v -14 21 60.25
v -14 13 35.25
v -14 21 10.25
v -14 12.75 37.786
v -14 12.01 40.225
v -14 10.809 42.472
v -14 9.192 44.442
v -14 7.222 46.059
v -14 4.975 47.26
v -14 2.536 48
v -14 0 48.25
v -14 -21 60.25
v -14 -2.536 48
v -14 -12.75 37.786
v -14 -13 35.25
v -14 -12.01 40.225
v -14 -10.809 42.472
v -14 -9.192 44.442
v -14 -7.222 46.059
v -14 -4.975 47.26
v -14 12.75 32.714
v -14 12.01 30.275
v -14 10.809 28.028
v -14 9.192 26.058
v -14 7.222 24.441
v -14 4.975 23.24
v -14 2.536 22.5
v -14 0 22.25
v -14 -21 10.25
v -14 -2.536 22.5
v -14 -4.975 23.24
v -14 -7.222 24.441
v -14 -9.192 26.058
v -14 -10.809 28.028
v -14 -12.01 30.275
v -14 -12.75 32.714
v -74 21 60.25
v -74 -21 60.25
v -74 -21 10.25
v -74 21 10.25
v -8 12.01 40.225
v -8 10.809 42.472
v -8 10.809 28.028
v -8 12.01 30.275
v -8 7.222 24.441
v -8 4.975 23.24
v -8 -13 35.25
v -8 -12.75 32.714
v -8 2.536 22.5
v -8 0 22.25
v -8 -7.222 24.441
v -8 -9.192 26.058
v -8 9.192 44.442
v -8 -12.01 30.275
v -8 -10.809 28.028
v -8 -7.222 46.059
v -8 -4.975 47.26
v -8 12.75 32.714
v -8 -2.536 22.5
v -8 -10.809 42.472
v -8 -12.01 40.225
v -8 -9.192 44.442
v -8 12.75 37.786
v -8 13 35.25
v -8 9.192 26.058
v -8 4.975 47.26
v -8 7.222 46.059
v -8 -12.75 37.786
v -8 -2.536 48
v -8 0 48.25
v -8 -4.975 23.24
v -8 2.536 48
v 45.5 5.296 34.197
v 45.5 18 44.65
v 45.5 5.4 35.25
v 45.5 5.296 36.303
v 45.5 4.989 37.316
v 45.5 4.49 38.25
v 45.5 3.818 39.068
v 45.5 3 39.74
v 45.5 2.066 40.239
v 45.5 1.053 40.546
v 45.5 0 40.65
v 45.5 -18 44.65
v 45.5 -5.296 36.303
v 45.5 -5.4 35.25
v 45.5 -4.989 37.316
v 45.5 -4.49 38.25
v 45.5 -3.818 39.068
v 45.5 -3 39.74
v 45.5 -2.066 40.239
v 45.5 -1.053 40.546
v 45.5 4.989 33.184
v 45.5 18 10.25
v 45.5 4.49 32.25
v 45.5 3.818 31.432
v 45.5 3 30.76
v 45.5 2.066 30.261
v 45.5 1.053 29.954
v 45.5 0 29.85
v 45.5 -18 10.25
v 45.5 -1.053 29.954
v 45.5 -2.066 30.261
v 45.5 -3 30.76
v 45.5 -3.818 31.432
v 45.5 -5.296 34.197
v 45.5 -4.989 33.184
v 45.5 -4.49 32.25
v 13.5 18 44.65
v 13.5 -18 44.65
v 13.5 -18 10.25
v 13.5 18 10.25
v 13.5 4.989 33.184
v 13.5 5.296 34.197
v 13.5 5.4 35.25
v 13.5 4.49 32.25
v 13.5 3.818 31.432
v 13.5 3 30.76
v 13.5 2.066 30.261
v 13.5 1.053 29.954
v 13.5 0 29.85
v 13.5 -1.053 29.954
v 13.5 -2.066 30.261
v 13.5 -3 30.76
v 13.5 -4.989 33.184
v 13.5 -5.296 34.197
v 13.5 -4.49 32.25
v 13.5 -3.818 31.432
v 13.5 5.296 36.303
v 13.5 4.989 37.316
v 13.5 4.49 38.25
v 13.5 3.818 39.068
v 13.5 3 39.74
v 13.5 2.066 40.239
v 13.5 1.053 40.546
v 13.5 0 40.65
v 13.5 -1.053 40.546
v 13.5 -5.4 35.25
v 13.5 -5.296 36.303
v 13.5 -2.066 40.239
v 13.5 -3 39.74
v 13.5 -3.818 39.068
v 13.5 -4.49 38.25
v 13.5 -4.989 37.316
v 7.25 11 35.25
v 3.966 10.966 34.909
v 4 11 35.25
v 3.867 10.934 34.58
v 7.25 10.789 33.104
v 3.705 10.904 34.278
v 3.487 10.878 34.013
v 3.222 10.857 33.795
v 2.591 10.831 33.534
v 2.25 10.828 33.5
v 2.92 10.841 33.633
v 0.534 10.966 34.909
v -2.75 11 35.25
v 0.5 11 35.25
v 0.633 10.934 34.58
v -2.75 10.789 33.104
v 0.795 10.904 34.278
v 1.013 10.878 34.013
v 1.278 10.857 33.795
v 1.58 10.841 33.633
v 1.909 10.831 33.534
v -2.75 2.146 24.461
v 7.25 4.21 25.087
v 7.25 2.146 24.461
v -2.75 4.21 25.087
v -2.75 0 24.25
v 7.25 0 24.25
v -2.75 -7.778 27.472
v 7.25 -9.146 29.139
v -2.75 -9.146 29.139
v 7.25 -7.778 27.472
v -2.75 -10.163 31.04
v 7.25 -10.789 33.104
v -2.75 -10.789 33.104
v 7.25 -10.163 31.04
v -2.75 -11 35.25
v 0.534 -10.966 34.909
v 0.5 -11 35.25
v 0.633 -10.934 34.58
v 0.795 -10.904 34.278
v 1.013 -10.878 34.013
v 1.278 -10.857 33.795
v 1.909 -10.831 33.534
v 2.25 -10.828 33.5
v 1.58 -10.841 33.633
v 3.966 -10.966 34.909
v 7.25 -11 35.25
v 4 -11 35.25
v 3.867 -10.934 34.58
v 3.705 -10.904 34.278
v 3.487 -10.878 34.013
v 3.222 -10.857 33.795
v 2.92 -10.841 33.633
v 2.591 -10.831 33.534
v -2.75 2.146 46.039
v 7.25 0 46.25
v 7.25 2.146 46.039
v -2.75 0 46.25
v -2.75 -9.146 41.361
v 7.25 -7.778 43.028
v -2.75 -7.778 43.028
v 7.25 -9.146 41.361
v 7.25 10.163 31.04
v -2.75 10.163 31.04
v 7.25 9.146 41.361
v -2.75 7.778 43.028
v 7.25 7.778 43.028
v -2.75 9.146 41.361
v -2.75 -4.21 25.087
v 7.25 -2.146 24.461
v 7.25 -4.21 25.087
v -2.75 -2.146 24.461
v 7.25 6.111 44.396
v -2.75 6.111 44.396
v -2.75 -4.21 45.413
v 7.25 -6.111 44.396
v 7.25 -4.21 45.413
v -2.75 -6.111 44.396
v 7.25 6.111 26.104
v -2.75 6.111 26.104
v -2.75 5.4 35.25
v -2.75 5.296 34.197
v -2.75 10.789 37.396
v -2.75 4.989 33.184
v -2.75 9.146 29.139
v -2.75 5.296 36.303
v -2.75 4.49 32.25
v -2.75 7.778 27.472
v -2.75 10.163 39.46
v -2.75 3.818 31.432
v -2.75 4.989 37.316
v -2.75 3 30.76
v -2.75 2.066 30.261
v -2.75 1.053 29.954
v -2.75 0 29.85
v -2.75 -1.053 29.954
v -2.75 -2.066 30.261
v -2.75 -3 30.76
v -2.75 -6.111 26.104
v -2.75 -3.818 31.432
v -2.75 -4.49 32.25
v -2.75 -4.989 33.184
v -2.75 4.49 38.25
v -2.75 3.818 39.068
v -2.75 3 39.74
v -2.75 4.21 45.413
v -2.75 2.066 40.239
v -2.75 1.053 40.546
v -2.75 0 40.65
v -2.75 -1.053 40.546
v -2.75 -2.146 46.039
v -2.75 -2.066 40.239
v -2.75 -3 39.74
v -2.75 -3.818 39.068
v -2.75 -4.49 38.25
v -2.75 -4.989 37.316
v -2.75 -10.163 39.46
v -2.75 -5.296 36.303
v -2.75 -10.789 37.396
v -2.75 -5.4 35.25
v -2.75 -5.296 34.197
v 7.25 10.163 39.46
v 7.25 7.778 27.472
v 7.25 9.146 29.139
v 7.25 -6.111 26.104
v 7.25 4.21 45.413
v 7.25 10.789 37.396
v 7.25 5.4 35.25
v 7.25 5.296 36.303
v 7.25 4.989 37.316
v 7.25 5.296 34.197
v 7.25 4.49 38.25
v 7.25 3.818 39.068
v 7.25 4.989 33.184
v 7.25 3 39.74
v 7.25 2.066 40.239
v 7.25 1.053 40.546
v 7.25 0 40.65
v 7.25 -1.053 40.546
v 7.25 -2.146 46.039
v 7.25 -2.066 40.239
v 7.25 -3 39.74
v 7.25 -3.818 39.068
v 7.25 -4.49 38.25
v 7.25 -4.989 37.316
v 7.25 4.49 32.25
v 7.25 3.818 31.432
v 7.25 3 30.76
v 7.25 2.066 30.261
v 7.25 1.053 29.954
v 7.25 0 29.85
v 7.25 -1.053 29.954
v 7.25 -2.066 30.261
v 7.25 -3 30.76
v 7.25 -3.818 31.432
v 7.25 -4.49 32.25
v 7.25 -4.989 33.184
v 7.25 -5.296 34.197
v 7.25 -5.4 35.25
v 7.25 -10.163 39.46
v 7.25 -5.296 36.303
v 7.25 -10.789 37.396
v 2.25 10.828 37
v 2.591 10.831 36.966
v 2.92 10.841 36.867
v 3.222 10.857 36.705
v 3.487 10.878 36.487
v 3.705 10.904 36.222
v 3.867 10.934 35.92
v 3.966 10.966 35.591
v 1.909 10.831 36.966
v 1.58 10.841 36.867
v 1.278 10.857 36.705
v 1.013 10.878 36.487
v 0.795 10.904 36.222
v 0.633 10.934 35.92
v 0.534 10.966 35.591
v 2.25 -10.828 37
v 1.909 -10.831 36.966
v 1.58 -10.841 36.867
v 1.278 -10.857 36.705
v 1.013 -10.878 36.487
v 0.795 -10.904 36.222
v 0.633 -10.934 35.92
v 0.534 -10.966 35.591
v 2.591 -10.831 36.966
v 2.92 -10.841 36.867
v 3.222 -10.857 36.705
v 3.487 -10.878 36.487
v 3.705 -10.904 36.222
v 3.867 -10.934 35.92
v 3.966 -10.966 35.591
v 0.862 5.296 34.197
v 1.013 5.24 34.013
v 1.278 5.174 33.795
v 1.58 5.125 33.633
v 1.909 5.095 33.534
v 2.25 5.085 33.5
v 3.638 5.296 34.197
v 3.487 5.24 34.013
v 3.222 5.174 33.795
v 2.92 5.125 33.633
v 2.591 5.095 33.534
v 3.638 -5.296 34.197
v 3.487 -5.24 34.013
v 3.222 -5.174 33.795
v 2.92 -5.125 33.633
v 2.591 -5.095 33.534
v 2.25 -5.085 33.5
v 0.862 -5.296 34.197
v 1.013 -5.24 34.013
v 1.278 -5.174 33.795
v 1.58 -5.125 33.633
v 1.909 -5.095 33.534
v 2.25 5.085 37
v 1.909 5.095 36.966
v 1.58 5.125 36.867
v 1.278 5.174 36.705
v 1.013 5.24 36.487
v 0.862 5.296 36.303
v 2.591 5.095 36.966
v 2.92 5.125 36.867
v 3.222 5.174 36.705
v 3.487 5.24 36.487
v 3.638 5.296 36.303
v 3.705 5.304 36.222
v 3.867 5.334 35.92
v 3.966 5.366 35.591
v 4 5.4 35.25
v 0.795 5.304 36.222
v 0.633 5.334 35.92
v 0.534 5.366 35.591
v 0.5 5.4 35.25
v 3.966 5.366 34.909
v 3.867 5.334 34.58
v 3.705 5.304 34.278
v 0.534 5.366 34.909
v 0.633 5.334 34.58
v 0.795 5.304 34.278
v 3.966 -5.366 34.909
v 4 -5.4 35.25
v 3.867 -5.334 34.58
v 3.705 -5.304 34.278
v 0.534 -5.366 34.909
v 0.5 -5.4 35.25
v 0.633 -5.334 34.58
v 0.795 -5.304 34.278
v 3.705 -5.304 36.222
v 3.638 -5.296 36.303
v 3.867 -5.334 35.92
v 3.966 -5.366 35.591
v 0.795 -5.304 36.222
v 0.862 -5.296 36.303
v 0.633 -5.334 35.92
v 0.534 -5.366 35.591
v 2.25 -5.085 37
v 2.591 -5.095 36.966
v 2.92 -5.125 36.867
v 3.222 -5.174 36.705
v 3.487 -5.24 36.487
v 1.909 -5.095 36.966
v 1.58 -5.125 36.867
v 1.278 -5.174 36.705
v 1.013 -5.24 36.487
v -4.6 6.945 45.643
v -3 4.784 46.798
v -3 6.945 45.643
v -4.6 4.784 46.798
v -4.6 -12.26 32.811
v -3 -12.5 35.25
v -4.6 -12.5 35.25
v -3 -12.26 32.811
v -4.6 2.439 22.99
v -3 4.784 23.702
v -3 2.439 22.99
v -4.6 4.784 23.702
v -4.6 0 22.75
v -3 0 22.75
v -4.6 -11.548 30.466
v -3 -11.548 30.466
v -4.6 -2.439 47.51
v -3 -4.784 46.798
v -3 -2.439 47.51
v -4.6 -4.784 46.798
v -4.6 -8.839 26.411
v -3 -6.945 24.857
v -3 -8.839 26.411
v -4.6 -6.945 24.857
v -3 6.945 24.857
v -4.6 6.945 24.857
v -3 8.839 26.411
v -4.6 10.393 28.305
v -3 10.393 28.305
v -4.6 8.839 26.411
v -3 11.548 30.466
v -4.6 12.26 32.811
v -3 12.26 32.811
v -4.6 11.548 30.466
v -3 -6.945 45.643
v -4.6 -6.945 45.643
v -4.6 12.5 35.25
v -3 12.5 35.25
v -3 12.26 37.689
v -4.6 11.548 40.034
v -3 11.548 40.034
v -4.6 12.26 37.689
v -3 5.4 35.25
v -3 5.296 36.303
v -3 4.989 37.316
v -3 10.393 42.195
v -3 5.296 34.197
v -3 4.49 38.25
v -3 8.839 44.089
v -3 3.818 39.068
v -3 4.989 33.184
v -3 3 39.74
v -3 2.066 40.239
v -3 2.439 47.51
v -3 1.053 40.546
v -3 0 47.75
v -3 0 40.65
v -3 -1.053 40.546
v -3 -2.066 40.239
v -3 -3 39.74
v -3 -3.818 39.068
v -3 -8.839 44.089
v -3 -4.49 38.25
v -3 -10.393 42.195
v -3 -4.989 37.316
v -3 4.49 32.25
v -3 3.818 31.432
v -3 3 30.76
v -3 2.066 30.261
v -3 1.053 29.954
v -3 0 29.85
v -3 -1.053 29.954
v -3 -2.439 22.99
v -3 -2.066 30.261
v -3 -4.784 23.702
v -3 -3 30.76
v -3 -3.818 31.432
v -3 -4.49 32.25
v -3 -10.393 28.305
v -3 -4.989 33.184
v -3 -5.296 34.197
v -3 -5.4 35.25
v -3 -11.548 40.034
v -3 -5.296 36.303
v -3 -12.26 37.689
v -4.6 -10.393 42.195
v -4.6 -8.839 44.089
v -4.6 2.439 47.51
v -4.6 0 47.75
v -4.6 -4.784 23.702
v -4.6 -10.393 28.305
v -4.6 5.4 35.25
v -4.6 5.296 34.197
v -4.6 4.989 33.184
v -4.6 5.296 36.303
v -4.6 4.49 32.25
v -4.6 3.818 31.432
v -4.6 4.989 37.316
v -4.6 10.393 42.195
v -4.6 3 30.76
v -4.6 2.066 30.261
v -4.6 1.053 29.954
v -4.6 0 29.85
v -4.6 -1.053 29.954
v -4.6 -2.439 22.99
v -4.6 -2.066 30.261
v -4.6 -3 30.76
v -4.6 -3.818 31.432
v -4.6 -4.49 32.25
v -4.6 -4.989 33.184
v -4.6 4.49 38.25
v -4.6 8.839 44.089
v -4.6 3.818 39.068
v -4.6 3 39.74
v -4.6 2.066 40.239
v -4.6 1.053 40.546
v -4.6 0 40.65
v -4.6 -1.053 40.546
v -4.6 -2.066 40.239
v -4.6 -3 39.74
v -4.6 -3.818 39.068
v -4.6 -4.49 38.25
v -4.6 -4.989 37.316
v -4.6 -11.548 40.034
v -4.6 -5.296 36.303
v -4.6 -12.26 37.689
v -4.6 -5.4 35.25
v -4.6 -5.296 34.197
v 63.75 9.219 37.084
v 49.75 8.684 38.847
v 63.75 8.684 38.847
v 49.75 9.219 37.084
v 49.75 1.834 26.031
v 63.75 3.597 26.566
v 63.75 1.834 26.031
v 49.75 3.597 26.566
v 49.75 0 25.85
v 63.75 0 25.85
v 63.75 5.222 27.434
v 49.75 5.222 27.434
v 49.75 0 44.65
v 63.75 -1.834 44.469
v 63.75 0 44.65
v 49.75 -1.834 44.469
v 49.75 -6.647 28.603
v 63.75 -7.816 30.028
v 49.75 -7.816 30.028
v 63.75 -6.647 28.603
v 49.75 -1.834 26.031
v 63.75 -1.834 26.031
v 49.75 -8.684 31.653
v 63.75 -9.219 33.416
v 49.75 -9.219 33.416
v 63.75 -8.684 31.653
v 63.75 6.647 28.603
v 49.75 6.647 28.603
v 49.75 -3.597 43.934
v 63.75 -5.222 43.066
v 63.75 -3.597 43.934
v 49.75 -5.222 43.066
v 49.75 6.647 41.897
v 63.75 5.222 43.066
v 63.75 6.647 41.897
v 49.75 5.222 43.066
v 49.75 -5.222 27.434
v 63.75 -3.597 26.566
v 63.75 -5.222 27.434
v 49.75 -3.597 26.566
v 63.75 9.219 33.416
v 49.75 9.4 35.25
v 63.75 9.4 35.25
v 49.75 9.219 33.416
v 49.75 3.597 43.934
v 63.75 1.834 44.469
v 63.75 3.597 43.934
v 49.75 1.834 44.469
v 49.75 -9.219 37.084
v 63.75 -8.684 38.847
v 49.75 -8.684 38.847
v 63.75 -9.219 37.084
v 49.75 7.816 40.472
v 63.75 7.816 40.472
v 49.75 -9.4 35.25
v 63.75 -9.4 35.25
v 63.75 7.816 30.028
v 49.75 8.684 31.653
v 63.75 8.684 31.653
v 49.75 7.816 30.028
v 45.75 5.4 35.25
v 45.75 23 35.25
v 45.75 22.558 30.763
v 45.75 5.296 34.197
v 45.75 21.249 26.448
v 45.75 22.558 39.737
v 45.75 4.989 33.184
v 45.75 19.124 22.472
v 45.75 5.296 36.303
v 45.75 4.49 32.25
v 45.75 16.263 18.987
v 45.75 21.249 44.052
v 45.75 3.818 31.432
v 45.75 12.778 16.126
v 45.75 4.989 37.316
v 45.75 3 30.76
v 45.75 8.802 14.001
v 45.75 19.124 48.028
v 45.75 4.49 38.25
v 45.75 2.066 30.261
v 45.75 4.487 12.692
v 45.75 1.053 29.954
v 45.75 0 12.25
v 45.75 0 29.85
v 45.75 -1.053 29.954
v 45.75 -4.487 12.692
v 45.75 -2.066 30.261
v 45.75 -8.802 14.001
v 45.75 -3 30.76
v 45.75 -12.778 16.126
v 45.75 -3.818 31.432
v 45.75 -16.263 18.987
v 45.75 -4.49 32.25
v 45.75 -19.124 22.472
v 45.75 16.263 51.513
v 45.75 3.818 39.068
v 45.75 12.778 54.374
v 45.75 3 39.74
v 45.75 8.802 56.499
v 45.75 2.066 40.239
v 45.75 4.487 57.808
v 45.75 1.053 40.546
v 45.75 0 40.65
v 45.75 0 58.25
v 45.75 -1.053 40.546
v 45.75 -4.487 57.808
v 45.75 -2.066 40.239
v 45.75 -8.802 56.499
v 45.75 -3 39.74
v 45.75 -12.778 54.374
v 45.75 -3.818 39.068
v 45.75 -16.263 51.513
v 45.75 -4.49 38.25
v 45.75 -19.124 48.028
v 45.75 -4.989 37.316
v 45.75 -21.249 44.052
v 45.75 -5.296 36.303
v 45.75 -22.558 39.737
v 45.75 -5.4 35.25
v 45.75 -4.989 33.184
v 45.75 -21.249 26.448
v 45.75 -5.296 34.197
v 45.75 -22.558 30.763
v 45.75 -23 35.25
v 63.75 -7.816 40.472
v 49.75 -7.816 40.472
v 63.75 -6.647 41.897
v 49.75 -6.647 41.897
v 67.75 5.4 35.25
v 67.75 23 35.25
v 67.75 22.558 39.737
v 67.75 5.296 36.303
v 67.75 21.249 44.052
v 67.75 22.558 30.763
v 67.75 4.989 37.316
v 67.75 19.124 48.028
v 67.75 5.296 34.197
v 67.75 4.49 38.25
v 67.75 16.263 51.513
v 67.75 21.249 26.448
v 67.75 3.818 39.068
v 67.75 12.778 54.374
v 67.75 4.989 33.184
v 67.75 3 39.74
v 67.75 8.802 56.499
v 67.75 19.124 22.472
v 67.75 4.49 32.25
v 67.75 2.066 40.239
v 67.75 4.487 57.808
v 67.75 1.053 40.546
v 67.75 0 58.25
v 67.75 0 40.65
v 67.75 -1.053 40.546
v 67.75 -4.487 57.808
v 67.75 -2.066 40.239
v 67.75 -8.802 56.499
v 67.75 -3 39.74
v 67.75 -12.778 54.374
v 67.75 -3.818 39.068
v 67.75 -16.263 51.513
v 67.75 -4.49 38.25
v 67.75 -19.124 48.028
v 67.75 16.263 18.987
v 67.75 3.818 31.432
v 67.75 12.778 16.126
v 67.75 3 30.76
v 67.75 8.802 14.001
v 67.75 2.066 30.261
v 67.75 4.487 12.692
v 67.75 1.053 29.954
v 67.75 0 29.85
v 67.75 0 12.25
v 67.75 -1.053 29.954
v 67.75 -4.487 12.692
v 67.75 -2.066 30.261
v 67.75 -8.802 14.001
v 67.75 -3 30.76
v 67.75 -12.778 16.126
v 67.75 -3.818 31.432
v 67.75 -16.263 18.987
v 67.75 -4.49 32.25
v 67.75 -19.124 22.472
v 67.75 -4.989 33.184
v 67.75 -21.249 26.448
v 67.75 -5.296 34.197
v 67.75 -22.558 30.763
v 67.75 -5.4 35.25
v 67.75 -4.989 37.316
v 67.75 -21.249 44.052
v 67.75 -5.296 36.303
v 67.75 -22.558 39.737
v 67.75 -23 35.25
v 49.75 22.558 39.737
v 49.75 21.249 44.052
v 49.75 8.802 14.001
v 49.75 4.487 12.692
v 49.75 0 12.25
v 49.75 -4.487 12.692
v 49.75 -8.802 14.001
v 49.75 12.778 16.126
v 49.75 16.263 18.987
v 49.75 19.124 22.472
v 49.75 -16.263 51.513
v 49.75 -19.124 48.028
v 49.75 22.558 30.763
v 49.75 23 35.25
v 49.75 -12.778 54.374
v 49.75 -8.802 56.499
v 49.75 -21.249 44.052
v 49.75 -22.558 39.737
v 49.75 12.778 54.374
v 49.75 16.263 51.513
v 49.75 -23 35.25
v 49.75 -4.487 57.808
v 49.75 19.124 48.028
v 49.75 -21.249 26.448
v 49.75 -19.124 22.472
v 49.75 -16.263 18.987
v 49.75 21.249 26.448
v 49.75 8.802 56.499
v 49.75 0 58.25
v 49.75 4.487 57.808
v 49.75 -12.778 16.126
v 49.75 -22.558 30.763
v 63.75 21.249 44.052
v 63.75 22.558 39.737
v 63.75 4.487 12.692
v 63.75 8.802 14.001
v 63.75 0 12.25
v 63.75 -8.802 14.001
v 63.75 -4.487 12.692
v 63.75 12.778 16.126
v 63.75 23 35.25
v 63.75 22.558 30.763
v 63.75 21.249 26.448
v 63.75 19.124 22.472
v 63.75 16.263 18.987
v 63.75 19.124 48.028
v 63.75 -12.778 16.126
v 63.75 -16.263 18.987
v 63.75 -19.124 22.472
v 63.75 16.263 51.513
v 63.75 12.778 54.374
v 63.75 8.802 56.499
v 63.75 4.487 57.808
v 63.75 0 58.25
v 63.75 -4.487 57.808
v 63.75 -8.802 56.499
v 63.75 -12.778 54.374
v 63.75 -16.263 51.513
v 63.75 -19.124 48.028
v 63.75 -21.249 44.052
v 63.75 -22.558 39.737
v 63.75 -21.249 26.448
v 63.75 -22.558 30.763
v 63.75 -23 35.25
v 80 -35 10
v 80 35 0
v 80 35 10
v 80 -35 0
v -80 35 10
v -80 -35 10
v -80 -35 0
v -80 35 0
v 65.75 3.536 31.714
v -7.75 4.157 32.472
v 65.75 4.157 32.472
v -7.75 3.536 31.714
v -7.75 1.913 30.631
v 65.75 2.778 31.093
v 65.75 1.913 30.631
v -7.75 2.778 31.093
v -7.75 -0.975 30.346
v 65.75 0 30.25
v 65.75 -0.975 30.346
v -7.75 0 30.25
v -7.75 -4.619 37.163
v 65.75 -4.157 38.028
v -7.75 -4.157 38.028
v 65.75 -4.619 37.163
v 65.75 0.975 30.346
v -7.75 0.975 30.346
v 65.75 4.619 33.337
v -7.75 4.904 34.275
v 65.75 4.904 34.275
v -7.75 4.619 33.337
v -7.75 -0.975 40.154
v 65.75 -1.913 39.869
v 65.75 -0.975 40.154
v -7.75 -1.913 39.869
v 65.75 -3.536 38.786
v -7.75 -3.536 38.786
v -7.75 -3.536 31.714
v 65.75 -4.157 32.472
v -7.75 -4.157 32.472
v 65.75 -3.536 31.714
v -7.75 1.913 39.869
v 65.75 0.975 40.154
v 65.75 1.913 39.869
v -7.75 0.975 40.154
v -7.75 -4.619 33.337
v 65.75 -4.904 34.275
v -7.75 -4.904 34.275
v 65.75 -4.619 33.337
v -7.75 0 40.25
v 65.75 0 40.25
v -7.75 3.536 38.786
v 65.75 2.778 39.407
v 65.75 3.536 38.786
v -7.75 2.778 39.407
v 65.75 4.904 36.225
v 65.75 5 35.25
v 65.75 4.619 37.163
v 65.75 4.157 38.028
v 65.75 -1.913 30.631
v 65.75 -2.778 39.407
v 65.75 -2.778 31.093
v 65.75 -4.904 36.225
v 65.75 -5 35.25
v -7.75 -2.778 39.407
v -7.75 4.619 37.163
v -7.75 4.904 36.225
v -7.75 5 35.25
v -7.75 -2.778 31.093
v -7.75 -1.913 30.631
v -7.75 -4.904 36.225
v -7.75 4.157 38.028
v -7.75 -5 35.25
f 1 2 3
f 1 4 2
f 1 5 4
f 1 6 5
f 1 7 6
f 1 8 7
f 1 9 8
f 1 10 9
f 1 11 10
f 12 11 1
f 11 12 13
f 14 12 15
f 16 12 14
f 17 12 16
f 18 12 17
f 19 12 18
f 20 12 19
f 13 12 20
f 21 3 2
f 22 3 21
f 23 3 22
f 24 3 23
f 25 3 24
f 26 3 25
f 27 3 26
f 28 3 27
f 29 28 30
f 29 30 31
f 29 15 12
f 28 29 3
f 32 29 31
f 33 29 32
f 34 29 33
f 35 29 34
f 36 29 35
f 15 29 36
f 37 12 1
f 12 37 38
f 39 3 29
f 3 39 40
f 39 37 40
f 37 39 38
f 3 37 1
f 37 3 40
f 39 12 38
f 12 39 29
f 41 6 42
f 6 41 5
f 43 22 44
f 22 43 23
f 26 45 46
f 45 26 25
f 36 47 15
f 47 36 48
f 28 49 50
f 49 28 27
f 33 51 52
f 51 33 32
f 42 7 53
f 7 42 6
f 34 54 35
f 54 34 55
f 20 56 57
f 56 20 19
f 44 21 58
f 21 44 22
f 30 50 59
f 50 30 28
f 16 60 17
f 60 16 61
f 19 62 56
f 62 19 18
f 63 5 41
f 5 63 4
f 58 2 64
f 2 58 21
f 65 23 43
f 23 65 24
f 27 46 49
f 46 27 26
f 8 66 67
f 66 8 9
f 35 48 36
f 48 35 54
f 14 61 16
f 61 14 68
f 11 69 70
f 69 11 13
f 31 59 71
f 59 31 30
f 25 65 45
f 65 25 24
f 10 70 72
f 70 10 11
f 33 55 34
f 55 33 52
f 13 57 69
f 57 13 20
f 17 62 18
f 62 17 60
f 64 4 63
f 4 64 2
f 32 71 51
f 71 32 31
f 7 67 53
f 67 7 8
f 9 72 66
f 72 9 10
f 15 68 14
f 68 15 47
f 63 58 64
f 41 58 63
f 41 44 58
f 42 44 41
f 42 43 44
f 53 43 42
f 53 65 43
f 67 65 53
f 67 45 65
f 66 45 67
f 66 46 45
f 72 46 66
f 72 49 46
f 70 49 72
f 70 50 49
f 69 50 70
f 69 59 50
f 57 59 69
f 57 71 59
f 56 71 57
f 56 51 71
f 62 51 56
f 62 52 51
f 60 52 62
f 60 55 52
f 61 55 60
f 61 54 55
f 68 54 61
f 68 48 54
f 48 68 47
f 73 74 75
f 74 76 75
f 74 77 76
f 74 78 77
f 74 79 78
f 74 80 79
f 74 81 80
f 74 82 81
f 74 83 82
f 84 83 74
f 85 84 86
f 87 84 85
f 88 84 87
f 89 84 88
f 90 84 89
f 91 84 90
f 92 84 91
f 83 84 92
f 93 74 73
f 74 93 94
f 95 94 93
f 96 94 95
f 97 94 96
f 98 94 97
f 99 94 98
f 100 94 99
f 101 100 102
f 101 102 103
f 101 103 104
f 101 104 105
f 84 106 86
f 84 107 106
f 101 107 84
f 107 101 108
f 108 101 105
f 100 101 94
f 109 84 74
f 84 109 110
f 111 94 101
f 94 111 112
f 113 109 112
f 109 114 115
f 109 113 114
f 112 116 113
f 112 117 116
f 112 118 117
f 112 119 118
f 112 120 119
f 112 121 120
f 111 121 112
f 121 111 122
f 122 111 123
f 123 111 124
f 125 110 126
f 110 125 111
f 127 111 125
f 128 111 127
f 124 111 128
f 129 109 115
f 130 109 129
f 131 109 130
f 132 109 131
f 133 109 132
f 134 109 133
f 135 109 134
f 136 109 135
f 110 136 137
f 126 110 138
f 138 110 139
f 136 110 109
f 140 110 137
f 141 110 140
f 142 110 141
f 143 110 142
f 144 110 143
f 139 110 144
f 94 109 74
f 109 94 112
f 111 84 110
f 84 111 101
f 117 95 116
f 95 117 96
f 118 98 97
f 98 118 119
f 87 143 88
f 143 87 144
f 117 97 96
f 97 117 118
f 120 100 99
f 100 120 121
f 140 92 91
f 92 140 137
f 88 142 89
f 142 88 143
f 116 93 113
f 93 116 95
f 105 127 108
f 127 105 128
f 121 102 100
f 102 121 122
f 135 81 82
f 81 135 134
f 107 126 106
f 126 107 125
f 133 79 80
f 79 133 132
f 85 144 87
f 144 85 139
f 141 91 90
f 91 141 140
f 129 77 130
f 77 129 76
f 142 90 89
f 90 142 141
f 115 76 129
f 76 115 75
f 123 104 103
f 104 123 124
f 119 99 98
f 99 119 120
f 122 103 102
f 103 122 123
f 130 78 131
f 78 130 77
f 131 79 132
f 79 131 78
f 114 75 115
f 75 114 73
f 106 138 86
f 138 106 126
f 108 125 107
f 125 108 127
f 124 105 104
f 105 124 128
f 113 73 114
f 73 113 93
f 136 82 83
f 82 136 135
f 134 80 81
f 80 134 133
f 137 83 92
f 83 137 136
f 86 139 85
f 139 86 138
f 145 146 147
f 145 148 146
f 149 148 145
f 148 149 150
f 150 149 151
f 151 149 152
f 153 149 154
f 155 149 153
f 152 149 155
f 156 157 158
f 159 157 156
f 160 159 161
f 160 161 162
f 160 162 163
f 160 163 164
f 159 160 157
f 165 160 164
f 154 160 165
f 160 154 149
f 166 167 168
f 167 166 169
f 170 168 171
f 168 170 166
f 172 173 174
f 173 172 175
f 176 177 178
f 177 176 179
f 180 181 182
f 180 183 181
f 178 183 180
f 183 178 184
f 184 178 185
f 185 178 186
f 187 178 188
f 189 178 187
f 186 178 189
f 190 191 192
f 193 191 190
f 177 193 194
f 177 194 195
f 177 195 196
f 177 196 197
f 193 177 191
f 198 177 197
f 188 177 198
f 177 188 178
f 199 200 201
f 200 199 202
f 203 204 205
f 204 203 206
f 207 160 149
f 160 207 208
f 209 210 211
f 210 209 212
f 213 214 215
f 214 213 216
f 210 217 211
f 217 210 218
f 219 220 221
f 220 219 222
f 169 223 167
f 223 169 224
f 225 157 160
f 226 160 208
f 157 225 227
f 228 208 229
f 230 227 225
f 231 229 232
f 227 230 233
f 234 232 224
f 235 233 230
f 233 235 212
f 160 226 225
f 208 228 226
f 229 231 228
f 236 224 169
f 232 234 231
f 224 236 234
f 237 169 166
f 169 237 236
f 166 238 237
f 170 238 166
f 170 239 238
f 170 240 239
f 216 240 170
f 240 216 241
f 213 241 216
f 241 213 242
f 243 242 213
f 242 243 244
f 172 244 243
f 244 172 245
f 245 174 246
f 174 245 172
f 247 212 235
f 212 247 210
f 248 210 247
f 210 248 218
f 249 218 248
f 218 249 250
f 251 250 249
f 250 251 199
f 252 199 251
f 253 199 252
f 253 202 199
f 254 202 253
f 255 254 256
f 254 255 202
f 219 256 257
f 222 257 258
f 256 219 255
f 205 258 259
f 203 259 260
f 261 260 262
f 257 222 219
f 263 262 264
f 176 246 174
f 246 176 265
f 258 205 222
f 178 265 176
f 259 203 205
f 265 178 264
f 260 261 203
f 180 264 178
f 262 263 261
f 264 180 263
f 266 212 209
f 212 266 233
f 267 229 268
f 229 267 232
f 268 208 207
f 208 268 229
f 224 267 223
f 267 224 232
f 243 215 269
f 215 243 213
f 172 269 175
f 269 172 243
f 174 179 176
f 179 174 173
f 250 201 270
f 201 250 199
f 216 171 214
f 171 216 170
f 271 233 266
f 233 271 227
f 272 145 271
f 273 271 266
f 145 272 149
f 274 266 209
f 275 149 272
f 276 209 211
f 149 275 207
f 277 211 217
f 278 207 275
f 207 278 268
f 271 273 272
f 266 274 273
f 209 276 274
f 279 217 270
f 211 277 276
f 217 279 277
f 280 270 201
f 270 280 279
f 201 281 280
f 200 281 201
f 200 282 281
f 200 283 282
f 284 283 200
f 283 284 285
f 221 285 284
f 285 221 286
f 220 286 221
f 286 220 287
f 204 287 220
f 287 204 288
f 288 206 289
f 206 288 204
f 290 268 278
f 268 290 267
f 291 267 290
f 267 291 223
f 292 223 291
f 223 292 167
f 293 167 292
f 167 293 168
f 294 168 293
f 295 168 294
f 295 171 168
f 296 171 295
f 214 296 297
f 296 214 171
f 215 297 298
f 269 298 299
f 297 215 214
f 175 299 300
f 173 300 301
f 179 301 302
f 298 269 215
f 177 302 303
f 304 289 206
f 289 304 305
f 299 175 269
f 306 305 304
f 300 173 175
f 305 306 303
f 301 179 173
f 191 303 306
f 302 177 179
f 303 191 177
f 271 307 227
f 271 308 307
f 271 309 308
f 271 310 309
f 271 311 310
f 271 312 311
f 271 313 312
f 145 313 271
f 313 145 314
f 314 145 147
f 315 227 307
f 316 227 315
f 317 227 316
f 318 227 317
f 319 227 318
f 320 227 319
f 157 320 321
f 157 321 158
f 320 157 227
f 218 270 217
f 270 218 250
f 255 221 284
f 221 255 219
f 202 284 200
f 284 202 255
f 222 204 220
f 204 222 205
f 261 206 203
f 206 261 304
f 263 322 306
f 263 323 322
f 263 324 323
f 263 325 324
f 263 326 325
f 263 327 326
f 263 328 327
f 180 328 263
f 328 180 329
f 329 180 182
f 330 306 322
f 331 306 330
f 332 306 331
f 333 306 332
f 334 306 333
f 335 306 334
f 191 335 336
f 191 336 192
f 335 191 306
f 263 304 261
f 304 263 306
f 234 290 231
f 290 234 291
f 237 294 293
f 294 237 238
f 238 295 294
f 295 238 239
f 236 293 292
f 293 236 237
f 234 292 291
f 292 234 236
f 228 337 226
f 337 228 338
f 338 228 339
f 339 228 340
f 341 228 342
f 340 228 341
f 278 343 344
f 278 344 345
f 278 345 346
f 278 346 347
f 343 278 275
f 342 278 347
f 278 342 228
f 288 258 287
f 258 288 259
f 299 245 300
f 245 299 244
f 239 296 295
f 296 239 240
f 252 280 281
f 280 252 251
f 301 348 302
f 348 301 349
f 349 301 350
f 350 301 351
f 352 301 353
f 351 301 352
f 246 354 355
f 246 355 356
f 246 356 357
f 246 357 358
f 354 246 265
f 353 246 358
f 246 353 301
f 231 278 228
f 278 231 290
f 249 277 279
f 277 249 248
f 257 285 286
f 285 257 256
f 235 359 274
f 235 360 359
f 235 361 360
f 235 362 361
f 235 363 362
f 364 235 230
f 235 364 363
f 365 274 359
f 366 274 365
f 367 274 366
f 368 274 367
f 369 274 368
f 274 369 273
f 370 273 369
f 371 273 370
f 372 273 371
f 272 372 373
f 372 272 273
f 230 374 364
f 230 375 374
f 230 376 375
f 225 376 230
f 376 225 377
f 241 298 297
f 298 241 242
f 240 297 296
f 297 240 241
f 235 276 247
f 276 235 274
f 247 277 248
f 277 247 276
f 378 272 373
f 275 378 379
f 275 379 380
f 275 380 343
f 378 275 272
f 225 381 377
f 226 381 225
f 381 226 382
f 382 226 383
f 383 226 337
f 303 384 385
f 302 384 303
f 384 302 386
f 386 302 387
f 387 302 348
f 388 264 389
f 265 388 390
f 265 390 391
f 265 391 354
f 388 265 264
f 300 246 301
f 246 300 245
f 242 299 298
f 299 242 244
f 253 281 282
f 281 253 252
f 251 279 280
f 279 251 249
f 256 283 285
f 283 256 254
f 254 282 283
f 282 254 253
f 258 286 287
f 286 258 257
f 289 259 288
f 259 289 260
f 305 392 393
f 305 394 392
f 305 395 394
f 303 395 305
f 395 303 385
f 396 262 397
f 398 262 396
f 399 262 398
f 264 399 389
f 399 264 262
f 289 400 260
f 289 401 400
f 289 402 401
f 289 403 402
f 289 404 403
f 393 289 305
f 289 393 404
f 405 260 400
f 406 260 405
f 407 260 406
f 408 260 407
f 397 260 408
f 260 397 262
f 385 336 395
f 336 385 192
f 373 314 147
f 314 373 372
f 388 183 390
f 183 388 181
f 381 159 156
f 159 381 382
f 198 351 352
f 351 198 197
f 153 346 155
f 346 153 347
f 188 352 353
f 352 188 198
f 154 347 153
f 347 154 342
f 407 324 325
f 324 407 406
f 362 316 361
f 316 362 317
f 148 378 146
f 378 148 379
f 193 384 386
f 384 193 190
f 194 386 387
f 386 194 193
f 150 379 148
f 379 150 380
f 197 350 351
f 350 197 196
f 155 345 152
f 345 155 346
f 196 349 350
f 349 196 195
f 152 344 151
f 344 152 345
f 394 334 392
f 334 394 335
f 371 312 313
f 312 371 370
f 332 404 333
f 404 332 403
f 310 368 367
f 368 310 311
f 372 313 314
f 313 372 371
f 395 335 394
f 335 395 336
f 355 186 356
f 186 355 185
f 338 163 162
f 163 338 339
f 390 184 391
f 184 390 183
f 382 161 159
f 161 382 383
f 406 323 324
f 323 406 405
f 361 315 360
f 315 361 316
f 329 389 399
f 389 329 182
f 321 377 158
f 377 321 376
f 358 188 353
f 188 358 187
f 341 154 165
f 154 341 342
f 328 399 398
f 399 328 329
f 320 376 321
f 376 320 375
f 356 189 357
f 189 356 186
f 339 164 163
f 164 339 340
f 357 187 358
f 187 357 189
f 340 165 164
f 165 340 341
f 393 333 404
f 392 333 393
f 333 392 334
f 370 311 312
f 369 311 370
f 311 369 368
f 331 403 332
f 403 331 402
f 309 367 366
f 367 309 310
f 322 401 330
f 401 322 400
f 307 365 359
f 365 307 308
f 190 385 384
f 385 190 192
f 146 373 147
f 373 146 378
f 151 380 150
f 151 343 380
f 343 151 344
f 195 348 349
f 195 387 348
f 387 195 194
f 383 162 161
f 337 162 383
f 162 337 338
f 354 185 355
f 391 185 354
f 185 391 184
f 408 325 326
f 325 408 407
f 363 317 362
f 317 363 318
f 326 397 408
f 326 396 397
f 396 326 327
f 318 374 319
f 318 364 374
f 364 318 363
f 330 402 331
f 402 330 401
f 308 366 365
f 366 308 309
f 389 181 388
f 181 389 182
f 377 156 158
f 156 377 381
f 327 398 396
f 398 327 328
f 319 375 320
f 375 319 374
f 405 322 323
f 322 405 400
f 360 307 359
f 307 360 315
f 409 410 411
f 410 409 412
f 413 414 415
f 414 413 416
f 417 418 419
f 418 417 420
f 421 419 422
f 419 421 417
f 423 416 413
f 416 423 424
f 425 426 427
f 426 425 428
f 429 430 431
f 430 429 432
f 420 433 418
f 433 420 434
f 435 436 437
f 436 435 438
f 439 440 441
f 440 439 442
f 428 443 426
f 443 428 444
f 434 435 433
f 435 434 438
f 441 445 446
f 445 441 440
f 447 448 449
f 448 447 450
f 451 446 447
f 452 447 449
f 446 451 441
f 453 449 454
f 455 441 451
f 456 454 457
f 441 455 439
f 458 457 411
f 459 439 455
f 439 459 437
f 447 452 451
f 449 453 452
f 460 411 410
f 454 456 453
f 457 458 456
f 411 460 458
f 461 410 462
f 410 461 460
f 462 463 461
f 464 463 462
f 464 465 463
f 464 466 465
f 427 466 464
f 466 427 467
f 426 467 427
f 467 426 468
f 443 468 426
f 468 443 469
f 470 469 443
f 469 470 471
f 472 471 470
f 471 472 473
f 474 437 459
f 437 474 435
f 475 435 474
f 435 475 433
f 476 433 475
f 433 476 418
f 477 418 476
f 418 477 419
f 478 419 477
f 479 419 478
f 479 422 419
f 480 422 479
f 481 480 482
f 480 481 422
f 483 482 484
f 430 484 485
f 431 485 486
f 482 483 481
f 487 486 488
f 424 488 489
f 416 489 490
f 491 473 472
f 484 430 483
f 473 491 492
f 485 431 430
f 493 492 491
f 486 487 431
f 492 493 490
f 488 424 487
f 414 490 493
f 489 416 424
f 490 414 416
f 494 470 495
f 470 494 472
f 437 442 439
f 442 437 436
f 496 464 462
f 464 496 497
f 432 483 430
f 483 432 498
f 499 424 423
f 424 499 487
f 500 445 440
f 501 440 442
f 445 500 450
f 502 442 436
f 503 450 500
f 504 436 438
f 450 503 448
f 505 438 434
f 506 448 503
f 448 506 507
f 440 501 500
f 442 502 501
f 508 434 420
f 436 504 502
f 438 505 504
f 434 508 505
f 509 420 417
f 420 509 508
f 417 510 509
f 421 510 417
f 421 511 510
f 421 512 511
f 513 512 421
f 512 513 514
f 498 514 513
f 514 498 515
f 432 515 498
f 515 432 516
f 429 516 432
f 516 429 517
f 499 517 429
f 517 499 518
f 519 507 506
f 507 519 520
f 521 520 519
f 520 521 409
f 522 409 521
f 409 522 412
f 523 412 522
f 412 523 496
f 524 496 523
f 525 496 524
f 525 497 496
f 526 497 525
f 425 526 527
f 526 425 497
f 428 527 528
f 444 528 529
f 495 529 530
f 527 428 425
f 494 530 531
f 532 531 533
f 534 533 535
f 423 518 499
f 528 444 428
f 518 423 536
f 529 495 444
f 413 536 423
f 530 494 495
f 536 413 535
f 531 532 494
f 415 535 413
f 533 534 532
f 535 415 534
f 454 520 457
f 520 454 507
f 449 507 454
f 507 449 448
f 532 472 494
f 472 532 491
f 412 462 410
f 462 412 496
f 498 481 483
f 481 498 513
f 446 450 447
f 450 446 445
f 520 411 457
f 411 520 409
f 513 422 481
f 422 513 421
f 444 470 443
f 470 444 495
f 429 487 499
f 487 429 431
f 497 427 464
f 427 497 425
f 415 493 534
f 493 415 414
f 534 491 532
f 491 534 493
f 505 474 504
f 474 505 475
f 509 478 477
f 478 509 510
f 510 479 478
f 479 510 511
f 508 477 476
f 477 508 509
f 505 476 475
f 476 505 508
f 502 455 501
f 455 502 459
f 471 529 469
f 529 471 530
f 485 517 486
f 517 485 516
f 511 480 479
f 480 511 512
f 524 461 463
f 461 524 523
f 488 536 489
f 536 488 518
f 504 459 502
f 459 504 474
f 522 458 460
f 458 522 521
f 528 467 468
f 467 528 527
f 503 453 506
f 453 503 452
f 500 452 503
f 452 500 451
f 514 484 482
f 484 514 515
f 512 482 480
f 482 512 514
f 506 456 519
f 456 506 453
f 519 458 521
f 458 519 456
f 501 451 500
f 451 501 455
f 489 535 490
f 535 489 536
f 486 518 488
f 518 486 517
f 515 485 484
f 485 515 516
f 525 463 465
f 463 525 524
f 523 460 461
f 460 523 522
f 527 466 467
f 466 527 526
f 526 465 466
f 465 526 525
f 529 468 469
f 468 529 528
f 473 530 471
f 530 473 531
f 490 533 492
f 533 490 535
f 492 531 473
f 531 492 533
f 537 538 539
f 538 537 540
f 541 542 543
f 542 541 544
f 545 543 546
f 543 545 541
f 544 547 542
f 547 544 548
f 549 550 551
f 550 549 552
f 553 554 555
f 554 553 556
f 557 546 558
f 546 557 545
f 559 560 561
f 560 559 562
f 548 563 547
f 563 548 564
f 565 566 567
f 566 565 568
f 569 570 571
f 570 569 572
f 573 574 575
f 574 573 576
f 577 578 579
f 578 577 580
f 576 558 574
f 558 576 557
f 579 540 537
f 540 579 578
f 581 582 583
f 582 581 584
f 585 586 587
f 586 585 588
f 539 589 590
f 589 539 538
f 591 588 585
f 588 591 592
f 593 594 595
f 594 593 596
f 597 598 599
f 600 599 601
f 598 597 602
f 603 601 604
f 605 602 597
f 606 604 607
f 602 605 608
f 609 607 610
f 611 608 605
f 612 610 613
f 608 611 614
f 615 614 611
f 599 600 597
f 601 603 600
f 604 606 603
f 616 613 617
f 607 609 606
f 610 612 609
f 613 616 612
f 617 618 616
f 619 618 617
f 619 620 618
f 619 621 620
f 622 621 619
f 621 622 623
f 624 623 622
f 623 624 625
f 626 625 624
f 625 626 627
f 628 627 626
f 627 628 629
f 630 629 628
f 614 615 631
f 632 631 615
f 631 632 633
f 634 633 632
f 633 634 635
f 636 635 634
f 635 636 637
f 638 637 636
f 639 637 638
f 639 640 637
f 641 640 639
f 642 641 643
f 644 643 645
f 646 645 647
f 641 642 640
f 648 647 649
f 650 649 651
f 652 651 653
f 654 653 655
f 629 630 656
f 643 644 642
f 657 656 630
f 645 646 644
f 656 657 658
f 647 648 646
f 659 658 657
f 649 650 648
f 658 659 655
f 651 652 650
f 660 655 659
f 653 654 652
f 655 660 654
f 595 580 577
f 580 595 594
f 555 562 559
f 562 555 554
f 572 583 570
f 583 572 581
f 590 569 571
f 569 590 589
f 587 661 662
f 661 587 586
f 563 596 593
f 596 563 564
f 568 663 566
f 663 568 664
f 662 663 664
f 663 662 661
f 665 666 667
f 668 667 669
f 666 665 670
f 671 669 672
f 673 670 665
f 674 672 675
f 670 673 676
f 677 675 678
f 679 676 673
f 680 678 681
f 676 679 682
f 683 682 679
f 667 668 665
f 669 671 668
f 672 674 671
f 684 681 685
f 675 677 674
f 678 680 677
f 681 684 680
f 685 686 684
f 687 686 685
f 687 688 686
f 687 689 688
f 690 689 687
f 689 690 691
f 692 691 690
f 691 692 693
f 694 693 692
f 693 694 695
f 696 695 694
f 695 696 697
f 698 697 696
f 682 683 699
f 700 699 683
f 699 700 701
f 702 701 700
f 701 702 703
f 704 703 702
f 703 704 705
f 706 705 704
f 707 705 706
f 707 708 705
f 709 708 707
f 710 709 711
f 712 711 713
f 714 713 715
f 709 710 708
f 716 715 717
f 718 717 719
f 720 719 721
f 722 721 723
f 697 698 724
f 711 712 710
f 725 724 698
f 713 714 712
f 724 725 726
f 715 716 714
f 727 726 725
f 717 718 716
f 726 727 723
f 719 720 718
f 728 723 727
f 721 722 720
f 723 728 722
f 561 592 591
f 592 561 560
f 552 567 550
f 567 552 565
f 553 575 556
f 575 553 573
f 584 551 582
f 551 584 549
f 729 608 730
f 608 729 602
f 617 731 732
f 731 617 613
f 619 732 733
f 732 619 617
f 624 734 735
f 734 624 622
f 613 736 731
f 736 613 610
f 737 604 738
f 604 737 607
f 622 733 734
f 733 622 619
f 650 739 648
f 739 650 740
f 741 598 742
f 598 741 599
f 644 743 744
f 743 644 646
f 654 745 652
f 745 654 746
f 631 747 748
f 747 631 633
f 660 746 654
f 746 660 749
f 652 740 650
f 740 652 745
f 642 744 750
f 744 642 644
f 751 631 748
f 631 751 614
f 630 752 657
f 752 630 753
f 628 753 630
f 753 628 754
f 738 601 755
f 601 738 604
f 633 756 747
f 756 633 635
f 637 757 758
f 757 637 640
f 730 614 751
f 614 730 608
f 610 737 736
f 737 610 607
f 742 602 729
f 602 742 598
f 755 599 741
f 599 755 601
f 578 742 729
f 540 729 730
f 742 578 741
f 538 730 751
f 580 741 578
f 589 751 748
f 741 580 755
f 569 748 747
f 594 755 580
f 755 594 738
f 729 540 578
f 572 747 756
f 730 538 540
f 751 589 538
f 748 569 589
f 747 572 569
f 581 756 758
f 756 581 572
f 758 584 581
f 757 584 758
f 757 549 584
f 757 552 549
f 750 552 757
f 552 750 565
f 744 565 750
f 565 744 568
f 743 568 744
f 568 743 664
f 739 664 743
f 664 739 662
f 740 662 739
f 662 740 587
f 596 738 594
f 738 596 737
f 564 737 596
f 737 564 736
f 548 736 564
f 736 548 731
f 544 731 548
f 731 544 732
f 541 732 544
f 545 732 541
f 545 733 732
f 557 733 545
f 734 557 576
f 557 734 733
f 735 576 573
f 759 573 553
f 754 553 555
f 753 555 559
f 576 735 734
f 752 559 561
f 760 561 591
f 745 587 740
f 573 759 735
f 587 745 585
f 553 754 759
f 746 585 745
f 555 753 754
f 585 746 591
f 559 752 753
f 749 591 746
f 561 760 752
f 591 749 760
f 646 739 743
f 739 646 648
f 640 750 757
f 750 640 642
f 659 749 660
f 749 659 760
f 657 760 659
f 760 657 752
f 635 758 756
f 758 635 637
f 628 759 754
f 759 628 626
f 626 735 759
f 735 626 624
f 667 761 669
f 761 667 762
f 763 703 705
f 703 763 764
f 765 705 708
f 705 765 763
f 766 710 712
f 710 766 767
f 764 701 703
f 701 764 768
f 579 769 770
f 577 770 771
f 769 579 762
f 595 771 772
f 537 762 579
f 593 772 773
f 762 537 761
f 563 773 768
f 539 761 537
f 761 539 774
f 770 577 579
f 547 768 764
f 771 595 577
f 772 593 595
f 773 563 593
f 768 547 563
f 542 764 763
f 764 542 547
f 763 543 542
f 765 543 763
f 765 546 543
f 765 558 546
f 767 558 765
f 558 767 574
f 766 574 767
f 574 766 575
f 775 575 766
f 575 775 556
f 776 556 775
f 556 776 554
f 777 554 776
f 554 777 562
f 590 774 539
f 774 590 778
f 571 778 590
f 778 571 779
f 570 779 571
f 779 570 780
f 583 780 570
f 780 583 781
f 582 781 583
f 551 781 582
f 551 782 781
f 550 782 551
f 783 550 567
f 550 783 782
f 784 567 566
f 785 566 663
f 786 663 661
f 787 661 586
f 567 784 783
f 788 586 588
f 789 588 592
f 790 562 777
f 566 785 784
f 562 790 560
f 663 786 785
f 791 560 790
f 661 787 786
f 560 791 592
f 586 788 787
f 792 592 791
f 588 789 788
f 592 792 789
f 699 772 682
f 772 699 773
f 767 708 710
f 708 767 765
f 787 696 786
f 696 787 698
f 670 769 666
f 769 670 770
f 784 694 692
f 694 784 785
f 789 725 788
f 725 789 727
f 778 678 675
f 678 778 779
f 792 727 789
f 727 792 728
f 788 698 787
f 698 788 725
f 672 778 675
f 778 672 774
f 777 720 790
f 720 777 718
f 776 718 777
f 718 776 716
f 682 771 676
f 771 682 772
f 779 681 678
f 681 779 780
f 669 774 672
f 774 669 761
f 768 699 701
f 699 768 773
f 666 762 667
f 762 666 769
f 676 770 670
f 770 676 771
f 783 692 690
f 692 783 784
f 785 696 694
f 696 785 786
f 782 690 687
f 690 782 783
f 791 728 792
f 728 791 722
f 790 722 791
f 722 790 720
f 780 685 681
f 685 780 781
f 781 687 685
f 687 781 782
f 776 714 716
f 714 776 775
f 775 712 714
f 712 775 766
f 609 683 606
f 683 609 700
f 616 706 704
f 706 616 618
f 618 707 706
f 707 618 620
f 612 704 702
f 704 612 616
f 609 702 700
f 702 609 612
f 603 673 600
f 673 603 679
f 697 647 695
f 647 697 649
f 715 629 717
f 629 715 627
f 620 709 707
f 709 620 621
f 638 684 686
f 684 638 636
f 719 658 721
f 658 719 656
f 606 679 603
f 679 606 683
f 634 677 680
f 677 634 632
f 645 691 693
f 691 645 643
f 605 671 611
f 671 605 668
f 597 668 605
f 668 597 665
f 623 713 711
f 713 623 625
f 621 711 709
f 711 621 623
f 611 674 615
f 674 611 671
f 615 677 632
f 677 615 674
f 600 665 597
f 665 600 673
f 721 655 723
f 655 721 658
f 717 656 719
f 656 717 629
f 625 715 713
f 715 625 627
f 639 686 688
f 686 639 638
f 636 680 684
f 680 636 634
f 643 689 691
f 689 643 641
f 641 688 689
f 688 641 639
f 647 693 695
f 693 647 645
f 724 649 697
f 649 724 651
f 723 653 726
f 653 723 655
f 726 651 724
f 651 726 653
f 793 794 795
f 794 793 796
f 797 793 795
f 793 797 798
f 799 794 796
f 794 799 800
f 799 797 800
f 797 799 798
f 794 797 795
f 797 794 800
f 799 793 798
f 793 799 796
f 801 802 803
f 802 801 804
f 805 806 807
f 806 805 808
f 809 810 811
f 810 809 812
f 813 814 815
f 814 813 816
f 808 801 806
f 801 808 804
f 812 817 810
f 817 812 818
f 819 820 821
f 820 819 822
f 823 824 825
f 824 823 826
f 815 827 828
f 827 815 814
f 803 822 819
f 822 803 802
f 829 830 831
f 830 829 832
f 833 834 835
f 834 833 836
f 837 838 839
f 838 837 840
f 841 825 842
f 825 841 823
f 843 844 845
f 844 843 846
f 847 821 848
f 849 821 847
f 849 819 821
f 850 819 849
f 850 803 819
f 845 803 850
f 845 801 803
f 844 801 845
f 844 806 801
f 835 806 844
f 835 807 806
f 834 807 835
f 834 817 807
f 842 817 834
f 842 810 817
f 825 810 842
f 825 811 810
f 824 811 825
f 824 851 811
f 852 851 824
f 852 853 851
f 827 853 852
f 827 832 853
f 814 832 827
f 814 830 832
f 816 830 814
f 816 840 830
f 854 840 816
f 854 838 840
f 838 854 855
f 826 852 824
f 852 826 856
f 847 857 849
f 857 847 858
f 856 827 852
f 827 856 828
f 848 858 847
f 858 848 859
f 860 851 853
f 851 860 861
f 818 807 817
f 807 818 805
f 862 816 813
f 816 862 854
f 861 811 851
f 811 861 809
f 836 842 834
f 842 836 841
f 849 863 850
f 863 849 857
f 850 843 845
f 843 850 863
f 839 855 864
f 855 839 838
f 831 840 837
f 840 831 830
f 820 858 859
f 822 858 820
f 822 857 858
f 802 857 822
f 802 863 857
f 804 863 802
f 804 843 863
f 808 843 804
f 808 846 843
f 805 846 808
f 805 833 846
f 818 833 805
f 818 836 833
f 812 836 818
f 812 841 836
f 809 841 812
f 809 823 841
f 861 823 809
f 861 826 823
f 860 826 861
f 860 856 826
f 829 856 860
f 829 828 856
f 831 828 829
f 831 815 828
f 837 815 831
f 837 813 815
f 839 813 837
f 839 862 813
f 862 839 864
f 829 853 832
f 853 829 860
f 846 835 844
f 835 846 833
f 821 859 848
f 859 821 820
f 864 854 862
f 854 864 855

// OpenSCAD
$fn = 32;

// ------------------------------------------------------------------------
// Motor drive station: motor 60 x 50 mm, shaft d10, pulley d46
// Every part is its own module, assembly() places every instance.
// ------------------------------------------------------------------------

// --- part 1 ---
module station_bed() {
  difference() {
    translate([-80, -35, 0]) cube([160, 70, 10]);
  }
}

// --- part 2 ---
module drive_motor() {
  union() {
    translate([-30, -21, 0]) cube([60, 42, 50]);
    translate([33, 0, 25]) rotate([0, 90, 0]) cylinder(h = 6, d = 26, center = true);
  }
}

// --- part 3 ---
module pillow_block() {
  difference() {
    translate([-16, -18, 0]) cube([32, 36, 34.4]);
    translate([0, 0, 25]) rotate([0, 90, 0]) cylinder(h = 34, d = 10.8, center = true);
  }
}

// --- part 4 ---
module drive_shaft() {
  translate([0, 0, -36.75]) cylinder(h = 73.5, d = 10);
}

// --- part 5 ---
module shaft_collar() {
  difference() {
    cylinder(h = 10, d = 22);
    translate([0, 0, -1]) cylinder(h = 12, d = 10.8);
    translate([0, 0, 5]) rotate([90, 0, 0]) cylinder(h = 24, d = 3.5, center = true);
  }
}

// --- part 6 ---
module collar_washer() {
  difference() {
      translate([0, 0, 0]) cylinder(h = 1.6, d = 25);
      translate([0, 0, -1]) cylinder(h = 3.6, d = 10.8);
    }
}

// --- part 7 ---
module drive_pulley() {
  difference() {
    union() {
      cylinder(h = 22, d = 18.8);
      cylinder(h = 4, d = 46);
      translate([0, 0, 18]) cylinder(h = 4, d = 46);
    }
    translate([0, 0, -1]) cylinder(h = 24, d = 10.8);
  }
}

// --- assembly ---
module assembly() {
  color([0.80, 0.24, 0.20]) translate([0, 0, 0]) rotate([0, 0, 0]) station_bed();
  color([0.20, 0.45, 0.75]) translate([-44, 0, 10.25]) rotate([0, 0, 0]) drive_motor();
  color([0.25, 0.62, 0.32]) translate([29.5, 0, 10.25]) rotate([0, 0, 0]) pillow_block();
  color([0.92, 0.70, 0.18]) translate([29, 0, 35.25]) rotate([0, 90, 0]) drive_shaft();
  color([0.58, 0.35, 0.70]) translate([-2.75, 0, 35.25]) rotate([0, 90, 0]) shaft_collar();
  color([0.16, 0.66, 0.66]) translate([-4.6, 0, 35.25]) rotate([0, 90, 0]) collar_washer();
  color([0.85, 0.48, 0.18]) translate([45.75, 0, 35.25]) rotate([0, 90, 0]) drive_pulley();
}

assembly();
